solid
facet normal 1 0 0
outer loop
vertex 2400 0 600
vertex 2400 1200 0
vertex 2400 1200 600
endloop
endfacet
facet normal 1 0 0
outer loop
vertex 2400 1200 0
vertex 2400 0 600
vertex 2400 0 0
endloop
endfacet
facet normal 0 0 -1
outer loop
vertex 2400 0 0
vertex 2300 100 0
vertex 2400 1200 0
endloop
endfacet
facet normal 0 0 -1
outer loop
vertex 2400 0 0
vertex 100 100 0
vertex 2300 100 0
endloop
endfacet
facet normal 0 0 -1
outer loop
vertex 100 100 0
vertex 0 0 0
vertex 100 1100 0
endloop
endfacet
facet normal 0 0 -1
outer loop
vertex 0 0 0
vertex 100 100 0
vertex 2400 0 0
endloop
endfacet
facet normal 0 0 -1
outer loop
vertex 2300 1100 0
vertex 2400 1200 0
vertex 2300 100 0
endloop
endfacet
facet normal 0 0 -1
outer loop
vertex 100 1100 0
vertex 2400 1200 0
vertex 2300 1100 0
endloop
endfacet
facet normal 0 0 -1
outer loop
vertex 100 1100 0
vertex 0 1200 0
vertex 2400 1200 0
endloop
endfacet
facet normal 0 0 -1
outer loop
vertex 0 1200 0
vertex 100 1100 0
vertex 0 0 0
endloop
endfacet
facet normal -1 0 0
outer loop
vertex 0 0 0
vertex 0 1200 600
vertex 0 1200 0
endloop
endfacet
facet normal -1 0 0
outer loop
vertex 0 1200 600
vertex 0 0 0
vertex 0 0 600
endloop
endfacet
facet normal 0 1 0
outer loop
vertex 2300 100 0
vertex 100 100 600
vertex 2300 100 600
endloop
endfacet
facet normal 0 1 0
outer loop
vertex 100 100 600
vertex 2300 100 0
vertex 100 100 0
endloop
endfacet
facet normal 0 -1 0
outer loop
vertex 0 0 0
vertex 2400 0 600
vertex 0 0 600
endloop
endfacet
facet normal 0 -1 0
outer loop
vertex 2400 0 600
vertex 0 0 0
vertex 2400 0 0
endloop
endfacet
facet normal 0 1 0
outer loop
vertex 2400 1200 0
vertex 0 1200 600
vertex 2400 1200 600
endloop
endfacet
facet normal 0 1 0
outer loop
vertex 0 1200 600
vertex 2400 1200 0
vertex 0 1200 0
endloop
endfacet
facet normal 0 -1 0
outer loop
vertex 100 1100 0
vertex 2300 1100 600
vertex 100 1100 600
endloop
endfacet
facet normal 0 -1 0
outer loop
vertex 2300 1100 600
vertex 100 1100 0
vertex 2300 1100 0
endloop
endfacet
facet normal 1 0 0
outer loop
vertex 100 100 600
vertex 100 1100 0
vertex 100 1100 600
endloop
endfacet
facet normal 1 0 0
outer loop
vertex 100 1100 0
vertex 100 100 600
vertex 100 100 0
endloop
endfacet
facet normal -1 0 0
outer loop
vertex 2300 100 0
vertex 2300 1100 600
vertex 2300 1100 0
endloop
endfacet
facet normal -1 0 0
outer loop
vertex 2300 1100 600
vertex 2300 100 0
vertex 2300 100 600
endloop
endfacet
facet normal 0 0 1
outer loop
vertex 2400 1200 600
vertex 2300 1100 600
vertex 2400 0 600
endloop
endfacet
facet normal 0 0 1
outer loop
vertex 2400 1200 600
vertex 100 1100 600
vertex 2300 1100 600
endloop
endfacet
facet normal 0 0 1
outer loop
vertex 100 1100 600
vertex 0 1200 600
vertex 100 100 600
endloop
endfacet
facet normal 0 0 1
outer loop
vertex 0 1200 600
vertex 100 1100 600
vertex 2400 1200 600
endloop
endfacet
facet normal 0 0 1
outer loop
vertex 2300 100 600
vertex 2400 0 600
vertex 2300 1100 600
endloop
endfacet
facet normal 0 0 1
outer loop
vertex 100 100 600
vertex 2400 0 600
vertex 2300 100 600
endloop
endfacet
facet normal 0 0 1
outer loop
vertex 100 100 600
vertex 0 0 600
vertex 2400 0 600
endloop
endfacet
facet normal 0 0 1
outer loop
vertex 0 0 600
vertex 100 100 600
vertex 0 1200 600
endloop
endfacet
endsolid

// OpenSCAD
// Generated from plan.json; millimetres. Not a structural design.
// Open in OpenSCAD. Increase explode_mm to inspect courses.
explode_mm = 0;
$fn = 24;
show_fixing_paths = false;

// front-01-C1-S
translate([0, 0, 0+0*explode_mm])
  color([0.70,0.52,0.33]) cube([2400, 100, 200]);
// front-01-C1-N
translate([0, 1100, 0+0*explode_mm])
  color([0.70,0.52,0.33]) cube([2400, 100, 200]);
// front-01-C1-W
translate([0, 100, 0+0*explode_mm])
  color([0.70,0.52,0.33]) cube([100, 1000, 200]);
// front-01-C1-E
translate([2300, 100, 0+0*explode_mm])
  color([0.70,0.52,0.33]) cube([100, 1000, 200]);
// front-01-C2-S
translate([100, 0, 200+1*explode_mm])
  color([0.70,0.52,0.33]) cube([2200, 100, 200]);
// front-01-C2-N
translate([100, 1100, 200+1*explode_mm])
  color([0.70,0.52,0.33]) cube([2200, 100, 200]);
// front-01-C2-W
translate([0, 0, 200+1*explode_mm])
  color([0.70,0.52,0.33]) cube([100, 1200, 200]);
// front-01-C2-E
translate([2300, 0, 200+1*explode_mm])
  color([0.70,0.52,0.33]) cube([100, 1200, 200]);
// front-01-C3-S
translate([0, 0, 400+2*explode_mm])
  color([0.70,0.52,0.33]) cube([2400, 100, 200]);
// front-01-C3-N
translate([0, 1100, 400+2*explode_mm])
  color([0.70,0.52,0.33]) cube([2400, 100, 200]);
// front-01-C3-W
translate([0, 100, 400+2*explode_mm])
  color([0.70,0.52,0.33]) cube([100, 1000, 200]);
// front-01-C3-E
translate([2300, 100, 400+2*explode_mm])
  color([0.70,0.52,0.33]) cube([100, 1000, 200]);
if (show_fixing_paths) translate([50.0, 1200, 50.0+0*explode_mm]) rotate([90,0,0]) color([0.8,0.1,0.1]) cylinder(d=7, h=150);
if (show_fixing_paths) translate([50.0, 1200, 150.0+0*explode_mm]) rotate([90,0,0]) color([0.8,0.1,0.1]) cylinder(d=7, h=150);
if (show_fixing_paths) translate([2350.0, 1200, 50.0+0*explode_mm]) rotate([90,0,0]) color([0.8,0.1,0.1]) cylinder(d=7, h=150);
if (show_fixing_paths) translate([2350.0, 1200, 150.0+0*explode_mm]) rotate([90,0,0]) color([0.8,0.1,0.1]) cylinder(d=7, h=150);
if (show_fixing_paths) translate([50.0, 0, 50.0+0*explode_mm]) rotate([-90,0,0]) color([0.8,0.1,0.1]) cylinder(d=7, h=150);
if (show_fixing_paths) translate([50.0, 0, 150.0+0*explode_mm]) rotate([-90,0,0]) color([0.8,0.1,0.1]) cylinder(d=7, h=150);
if (show_fixing_paths) translate([2350.0, 0, 50.0+0*explode_mm]) rotate([-90,0,0]) color([0.8,0.1,0.1]) cylinder(d=7, h=150);
if (show_fixing_paths) translate([2350.0, 0, 150.0+0*explode_mm]) rotate([-90,0,0]) color([0.8,0.1,0.1]) cylinder(d=7, h=150);
if (show_fixing_paths) translate([2400, 50.0, 250.0+1*explode_mm]) rotate([0,-90,0]) color([0.8,0.1,0.1]) cylinder(d=7, h=150);
if (show_fixing_paths) translate([2400, 50.0, 350.0+1*explode_mm]) rotate([0,-90,0]) color([0.8,0.1,0.1]) cylinder(d=7, h=150);
if (show_fixing_paths) translate([2400, 1150.0, 250.0+1*explode_mm]) rotate([0,-90,0]) color([0.8,0.1,0.1]) cylinder(d=7, h=150);
if (show_fixing_paths) translate([2400, 1150.0, 350.0+1*explode_mm]) rotate([0,-90,0]) color([0.8,0.1,0.1]) cylinder(d=7, h=150);
if (show_fixing_paths) translate([2350.0, 200.0, 400+1*explode_mm]) rotate([180,0,0]) color([0.8,0.1,0.1]) cylinder(d=7, h=250);
if (show_fixing_paths) translate([2350.0, 600.0, 400+1*explode_mm]) rotate([180,0,0]) color([0.8,0.1,0.1]) cylinder(d=7, h=250);
if (show_fixing_paths) translate([2350.0, 1000.0, 400+1*explode_mm]) rotate([180,0,0]) color([0.8,0.1,0.1]) cylinder(d=7, h=250);
if (show_fixing_paths) translate([300.0, 1150.0, 400+1*explode_mm]) rotate([180,0,0]) color([0.8,0.1,0.1]) cylinder(d=7, h=250);
if (show_fixing_paths) translate([900.0, 1150.0, 400+1*explode_mm]) rotate([180,0,0]) color([0.8,0.1,0.1]) cylinder(d=7, h=250);
if (show_fixing_paths) translate([1500.0, 1150.0, 400+1*explode_mm]) rotate([180,0,0]) color([0.8,0.1,0.1]) cylinder(d=7, h=250);
if (show_fixing_paths) translate([2100.0, 1150.0, 400+1*explode_mm]) rotate([180,0,0]) color([0.8,0.1,0.1]) cylinder(d=7, h=250);
if (show_fixing_paths) translate([300.0, 50.0, 400+1*explode_mm]) rotate([180,0,0]) color([0.8,0.1,0.1]) cylinder(d=7, h=250);
if (show_fixing_paths) translate([900.0, 50.0, 400+1*explode_mm]) rotate([180,0,0]) color([0.8,0.1,0.1]) cylinder(d=7, h=250);
if (show_fixing_paths) translate([1500.0, 50.0, 400+1*explode_mm]) rotate([180,0,0]) color([0.8,0.1,0.1]) cylinder(d=7, h=250);
if (show_fixing_paths) translate([2100.0, 50.0, 400+1*explode_mm]) rotate([180,0,0]) color([0.8,0.1,0.1]) cylinder(d=7, h=250);
if (show_fixing_paths) translate([0, 50.0, 250.0+1*explode_mm]) rotate([0,90,0]) color([0.8,0.1,0.1]) cylinder(d=7, h=150);
if (show_fixing_paths) translate([0, 50.0, 350.0+1*explode_mm]) rotate([0,90,0]) color([0.8,0.1,0.1]) cylinder(d=7, h=150);
if (show_fixing_paths) translate([0, 1150.0, 250.0+1*explode_mm]) rotate([0,90,0]) color([0.8,0.1,0.1]) cylinder(d=7, h=150);
if (show_fixing_paths) translate([0, 1150.0, 350.0+1*explode_mm]) rotate([0,90,0]) color([0.8,0.1,0.1]) cylinder(d=7, h=150);
if (show_fixing_paths) translate([50.0, 200.0, 400+1*explode_mm]) rotate([180,0,0]) color([0.8,0.1,0.1]) cylinder(d=7, h=250);
if (show_fixing_paths) translate([50.0, 600.0, 400+1*explode_mm]) rotate([180,0,0]) color([0.8,0.1,0.1]) cylinder(d=7, h=250);
if (show_fixing_paths) translate([50.0, 1000.0, 400+1*explode_mm]) rotate([180,0,0]) color([0.8,0.1,0.1]) cylinder(d=7, h=250);
if (show_fixing_paths) translate([2350.0, 340.0, 600+2*explode_mm]) rotate([180,0,0]) color([0.8,0.1,0.1]) cylinder(d=7, h=250);
if (show_fixing_paths) translate([2350.0, 940.0, 600+2*explode_mm]) rotate([180,0,0]) color([0.8,0.1,0.1]) cylinder(d=7, h=250);
if (show_fixing_paths) translate([50.0, 1200, 450.0+2*explode_mm]) rotate([90,0,0]) color([0.8,0.1,0.1]) cylinder(d=7, h=150);
if (show_fixing_paths) translate([50.0, 1200, 550.0+2*explode_mm]) rotate([90,0,0]) color([0.8,0.1,0.1]) cylinder(d=7, h=150);
if (show_fixing_paths) translate([2350.0, 1200, 450.0+2*explode_mm]) rotate([90,0,0]) color([0.8,0.1,0.1]) cylinder(d=7, h=150);
if (show_fixing_paths) translate([2350.0, 1200, 550.0+2*explode_mm]) rotate([90,0,0]) color([0.8,0.1,0.1]) cylinder(d=7, h=150);
if (show_fixing_paths) translate([240.0, 1150.0, 600+2*explode_mm]) rotate([180,0,0]) color([0.8,0.1,0.1]) cylinder(d=7, h=250);
if (show_fixing_paths) translate([740.0, 1150.0, 600+2*explode_mm]) rotate([180,0,0]) color([0.8,0.1,0.1]) cylinder(d=7, h=250);
if (show_fixing_paths) translate([1240.0, 1150.0, 600+2*explode_mm]) rotate([180,0,0]) color([0.8,0.1,0.1]) cylinder(d=7, h=250);
if (show_fixing_paths) translate([1740.0, 1150.0, 600+2*explode_mm]) rotate([180,0,0]) color([0.8,0.1,0.1]) cylinder(d=7, h=250);
if (show_fixing_paths) translate([2220.0, 1150.0, 600+2*explode_mm]) rotate([180,0,0]) color([0.8,0.1,0.1]) cylinder(d=7, h=250);
if (show_fixing_paths) translate([50.0, 0, 450.0+2*explode_mm]) rotate([-90,0,0]) color([0.8,0.1,0.1]) cylinder(d=7, h=150);
if (show_fixing_paths) translate([50.0, 0, 550.0+2*explode_mm]) rotate([-90,0,0]) color([0.8,0.1,0.1]) cylinder(d=7, h=150);
if (show_fixing_paths) translate([2350.0, 0, 450.0+2*explode_mm]) rotate([-90,0,0]) color([0.8,0.1,0.1]) cylinder(d=7, h=150);
if (show_fixing_paths) translate([2350.0, 0, 550.0+2*explode_mm]) rotate([-90,0,0]) color([0.8,0.1,0.1]) cylinder(d=7, h=150);
if (show_fixing_paths) translate([240.0, 50.0, 600+2*explode_mm]) rotate([180,0,0]) color([0.8,0.1,0.1]) cylinder(d=7, h=250);
if (show_fixing_paths) translate([740.0, 50.0, 600+2*explode_mm]) rotate([180,0,0]) color([0.8,0.1,0.1]) cylinder(d=7, h=250);
if (show_fixing_paths) translate([1240.0, 50.0, 600+2*explode_mm]) rotate([180,0,0]) color([0.8,0.1,0.1]) cylinder(d=7, h=250);
if (show_fixing_paths) translate([1740.0, 50.0, 600+2*explode_mm]) rotate([180,0,0]) color([0.8,0.1,0.1]) cylinder(d=7, h=250);
if (show_fixing_paths) translate([2220.0, 50.0, 600+2*explode_mm]) rotate([180,0,0]) color([0.8,0.1,0.1]) cylinder(d=7, h=250);
if (show_fixing_paths) translate([50.0, 340.0, 600+2*explode_mm]) rotate([180,0,0]) color([0.8,0.1,0.1]) cylinder(d=7, h=250);
if (show_fixing_paths) translate([50.0, 940.0, 600+2*explode_mm]) rotate([180,0,0]) color([0.8,0.1,0.1]) cylinder(d=7, h=250);
